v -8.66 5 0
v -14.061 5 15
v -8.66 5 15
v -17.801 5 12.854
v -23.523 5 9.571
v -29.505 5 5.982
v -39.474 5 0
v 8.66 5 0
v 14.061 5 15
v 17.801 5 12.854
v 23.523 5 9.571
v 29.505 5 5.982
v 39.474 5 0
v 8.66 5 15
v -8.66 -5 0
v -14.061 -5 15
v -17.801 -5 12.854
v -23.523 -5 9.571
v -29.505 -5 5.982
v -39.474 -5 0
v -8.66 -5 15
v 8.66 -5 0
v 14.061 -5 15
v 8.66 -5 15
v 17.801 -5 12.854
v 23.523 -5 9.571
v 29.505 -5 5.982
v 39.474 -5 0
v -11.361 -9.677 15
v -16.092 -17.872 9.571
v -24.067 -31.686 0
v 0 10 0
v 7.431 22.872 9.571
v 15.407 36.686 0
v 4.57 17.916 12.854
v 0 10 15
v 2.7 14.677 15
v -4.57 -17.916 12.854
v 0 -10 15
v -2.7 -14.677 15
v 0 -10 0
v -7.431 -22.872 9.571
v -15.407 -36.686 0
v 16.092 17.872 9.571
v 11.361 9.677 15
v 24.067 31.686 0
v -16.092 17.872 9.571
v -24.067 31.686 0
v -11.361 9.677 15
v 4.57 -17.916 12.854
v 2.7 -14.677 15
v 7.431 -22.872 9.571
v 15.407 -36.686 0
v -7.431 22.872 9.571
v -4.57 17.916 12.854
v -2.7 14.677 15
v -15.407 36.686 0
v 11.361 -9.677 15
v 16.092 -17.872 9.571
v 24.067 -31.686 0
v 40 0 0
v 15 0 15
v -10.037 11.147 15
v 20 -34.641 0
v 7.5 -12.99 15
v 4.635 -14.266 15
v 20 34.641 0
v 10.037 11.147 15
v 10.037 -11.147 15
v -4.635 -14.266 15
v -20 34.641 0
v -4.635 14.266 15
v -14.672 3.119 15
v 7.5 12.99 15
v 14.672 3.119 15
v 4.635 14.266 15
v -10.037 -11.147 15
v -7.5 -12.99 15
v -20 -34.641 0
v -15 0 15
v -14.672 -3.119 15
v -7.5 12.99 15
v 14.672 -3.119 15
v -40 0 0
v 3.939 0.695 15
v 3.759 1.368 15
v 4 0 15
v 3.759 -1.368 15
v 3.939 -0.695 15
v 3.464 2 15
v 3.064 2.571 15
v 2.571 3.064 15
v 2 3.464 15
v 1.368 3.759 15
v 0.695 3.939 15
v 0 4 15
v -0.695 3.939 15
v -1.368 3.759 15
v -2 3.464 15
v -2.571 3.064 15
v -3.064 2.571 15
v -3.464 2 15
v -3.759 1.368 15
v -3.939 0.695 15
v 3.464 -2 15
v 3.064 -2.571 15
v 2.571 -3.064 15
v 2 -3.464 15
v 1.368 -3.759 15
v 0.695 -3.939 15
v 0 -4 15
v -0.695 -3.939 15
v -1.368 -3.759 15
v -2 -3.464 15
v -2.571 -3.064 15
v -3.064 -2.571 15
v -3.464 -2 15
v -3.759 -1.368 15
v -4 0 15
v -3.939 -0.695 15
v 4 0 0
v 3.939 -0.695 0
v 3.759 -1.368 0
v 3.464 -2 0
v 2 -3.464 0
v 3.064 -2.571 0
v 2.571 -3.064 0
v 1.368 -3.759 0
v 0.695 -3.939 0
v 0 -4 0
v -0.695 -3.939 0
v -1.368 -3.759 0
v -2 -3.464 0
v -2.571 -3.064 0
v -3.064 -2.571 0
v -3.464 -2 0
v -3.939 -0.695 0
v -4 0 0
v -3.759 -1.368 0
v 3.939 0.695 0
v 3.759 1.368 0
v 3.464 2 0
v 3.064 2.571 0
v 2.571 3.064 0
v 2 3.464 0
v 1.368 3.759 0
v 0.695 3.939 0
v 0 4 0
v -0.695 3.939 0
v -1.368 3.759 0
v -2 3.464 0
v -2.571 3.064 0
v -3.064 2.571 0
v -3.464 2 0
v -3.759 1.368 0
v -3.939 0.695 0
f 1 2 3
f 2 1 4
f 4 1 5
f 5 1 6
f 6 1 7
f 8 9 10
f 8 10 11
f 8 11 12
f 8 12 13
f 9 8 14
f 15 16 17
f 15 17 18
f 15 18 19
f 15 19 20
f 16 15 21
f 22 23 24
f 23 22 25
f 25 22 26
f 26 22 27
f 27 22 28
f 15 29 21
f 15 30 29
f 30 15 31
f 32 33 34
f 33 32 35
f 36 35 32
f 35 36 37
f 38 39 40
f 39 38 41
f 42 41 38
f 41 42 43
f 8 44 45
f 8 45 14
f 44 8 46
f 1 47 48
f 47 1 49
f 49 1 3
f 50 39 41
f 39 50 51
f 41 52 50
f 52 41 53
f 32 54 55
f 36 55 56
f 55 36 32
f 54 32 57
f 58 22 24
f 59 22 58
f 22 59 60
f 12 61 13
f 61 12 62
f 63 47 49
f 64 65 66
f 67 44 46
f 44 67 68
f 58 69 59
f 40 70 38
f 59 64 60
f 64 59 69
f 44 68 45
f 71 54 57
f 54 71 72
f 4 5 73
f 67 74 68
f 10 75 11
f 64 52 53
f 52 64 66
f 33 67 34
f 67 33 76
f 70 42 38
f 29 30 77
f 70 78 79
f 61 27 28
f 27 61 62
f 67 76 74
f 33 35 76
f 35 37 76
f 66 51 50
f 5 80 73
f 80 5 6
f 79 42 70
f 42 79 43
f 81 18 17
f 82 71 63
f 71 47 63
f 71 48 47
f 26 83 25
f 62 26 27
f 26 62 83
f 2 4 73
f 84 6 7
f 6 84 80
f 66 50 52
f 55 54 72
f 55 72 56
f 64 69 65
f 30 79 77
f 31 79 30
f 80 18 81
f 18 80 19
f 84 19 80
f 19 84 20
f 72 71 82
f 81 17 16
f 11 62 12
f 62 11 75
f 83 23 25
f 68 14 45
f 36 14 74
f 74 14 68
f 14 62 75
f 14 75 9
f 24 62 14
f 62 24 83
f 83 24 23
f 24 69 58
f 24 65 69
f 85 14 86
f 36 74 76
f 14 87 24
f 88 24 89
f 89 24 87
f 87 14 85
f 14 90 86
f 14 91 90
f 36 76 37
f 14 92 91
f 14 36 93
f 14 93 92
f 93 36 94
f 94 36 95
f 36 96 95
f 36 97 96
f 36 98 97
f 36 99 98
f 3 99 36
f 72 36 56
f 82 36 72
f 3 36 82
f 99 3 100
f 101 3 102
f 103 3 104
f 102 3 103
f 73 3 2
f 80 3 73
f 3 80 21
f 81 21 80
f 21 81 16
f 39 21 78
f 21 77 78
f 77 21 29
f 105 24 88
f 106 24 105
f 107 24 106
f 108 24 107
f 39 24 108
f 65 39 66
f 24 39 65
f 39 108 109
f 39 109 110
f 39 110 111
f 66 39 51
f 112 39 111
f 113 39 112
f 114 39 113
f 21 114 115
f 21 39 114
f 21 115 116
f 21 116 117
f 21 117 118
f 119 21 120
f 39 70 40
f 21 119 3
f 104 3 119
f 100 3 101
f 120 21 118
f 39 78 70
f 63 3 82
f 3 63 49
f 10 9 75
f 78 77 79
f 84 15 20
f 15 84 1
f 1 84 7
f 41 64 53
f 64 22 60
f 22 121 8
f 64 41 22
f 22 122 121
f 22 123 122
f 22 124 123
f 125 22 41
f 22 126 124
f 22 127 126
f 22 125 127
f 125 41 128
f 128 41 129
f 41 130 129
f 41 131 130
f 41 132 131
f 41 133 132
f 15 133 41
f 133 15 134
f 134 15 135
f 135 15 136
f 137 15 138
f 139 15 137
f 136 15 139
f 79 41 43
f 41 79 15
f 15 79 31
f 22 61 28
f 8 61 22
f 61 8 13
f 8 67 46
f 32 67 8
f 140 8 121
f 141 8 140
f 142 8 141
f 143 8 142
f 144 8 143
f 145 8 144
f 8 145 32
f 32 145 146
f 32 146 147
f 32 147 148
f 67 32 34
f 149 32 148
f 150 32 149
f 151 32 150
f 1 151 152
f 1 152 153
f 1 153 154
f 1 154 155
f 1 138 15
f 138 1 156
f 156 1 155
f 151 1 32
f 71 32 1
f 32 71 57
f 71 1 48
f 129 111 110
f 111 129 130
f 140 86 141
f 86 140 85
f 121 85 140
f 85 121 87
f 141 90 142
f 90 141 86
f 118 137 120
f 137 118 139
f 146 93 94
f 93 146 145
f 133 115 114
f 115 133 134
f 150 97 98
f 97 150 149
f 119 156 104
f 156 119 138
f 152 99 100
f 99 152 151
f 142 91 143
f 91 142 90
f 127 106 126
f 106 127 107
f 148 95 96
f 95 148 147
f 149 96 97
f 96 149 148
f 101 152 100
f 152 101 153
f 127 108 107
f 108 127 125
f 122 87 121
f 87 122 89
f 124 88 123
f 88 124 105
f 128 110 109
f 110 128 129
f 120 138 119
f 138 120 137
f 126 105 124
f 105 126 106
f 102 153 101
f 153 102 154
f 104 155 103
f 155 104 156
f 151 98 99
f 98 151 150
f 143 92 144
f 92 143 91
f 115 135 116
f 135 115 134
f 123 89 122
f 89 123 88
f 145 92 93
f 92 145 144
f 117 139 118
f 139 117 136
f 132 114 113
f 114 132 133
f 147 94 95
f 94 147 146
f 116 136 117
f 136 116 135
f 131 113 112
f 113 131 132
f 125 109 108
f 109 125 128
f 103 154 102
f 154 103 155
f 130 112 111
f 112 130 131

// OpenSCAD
InnerHoleDiameter = 8; // [5:40]
SmallestReelDiameter = 30; // [10:120
LargestReelDiameter = 80; // [10:120]
Height = 15; // [10:30]
ArmWidth = 10; // [5:20]
NumberOfArms = 6; // [2, 4, 6, 8, 10]
render(convexity=1){
    difference(){
      union(){
        intersection(){
          cylinder(d1=LargestReelDiameter, d2=SmallestReelDiameter, h=Height);
          for (i=[0:(360/NumberOfArms):360]){
            rotate([0, 0, i]) cube([LargestReelDiameter, ArmWidth, Height*3], center=true);
          }
        }
      }
      cylinder(d=InnerHoleDiameter, h=Height, $fn=36);
    }
}
